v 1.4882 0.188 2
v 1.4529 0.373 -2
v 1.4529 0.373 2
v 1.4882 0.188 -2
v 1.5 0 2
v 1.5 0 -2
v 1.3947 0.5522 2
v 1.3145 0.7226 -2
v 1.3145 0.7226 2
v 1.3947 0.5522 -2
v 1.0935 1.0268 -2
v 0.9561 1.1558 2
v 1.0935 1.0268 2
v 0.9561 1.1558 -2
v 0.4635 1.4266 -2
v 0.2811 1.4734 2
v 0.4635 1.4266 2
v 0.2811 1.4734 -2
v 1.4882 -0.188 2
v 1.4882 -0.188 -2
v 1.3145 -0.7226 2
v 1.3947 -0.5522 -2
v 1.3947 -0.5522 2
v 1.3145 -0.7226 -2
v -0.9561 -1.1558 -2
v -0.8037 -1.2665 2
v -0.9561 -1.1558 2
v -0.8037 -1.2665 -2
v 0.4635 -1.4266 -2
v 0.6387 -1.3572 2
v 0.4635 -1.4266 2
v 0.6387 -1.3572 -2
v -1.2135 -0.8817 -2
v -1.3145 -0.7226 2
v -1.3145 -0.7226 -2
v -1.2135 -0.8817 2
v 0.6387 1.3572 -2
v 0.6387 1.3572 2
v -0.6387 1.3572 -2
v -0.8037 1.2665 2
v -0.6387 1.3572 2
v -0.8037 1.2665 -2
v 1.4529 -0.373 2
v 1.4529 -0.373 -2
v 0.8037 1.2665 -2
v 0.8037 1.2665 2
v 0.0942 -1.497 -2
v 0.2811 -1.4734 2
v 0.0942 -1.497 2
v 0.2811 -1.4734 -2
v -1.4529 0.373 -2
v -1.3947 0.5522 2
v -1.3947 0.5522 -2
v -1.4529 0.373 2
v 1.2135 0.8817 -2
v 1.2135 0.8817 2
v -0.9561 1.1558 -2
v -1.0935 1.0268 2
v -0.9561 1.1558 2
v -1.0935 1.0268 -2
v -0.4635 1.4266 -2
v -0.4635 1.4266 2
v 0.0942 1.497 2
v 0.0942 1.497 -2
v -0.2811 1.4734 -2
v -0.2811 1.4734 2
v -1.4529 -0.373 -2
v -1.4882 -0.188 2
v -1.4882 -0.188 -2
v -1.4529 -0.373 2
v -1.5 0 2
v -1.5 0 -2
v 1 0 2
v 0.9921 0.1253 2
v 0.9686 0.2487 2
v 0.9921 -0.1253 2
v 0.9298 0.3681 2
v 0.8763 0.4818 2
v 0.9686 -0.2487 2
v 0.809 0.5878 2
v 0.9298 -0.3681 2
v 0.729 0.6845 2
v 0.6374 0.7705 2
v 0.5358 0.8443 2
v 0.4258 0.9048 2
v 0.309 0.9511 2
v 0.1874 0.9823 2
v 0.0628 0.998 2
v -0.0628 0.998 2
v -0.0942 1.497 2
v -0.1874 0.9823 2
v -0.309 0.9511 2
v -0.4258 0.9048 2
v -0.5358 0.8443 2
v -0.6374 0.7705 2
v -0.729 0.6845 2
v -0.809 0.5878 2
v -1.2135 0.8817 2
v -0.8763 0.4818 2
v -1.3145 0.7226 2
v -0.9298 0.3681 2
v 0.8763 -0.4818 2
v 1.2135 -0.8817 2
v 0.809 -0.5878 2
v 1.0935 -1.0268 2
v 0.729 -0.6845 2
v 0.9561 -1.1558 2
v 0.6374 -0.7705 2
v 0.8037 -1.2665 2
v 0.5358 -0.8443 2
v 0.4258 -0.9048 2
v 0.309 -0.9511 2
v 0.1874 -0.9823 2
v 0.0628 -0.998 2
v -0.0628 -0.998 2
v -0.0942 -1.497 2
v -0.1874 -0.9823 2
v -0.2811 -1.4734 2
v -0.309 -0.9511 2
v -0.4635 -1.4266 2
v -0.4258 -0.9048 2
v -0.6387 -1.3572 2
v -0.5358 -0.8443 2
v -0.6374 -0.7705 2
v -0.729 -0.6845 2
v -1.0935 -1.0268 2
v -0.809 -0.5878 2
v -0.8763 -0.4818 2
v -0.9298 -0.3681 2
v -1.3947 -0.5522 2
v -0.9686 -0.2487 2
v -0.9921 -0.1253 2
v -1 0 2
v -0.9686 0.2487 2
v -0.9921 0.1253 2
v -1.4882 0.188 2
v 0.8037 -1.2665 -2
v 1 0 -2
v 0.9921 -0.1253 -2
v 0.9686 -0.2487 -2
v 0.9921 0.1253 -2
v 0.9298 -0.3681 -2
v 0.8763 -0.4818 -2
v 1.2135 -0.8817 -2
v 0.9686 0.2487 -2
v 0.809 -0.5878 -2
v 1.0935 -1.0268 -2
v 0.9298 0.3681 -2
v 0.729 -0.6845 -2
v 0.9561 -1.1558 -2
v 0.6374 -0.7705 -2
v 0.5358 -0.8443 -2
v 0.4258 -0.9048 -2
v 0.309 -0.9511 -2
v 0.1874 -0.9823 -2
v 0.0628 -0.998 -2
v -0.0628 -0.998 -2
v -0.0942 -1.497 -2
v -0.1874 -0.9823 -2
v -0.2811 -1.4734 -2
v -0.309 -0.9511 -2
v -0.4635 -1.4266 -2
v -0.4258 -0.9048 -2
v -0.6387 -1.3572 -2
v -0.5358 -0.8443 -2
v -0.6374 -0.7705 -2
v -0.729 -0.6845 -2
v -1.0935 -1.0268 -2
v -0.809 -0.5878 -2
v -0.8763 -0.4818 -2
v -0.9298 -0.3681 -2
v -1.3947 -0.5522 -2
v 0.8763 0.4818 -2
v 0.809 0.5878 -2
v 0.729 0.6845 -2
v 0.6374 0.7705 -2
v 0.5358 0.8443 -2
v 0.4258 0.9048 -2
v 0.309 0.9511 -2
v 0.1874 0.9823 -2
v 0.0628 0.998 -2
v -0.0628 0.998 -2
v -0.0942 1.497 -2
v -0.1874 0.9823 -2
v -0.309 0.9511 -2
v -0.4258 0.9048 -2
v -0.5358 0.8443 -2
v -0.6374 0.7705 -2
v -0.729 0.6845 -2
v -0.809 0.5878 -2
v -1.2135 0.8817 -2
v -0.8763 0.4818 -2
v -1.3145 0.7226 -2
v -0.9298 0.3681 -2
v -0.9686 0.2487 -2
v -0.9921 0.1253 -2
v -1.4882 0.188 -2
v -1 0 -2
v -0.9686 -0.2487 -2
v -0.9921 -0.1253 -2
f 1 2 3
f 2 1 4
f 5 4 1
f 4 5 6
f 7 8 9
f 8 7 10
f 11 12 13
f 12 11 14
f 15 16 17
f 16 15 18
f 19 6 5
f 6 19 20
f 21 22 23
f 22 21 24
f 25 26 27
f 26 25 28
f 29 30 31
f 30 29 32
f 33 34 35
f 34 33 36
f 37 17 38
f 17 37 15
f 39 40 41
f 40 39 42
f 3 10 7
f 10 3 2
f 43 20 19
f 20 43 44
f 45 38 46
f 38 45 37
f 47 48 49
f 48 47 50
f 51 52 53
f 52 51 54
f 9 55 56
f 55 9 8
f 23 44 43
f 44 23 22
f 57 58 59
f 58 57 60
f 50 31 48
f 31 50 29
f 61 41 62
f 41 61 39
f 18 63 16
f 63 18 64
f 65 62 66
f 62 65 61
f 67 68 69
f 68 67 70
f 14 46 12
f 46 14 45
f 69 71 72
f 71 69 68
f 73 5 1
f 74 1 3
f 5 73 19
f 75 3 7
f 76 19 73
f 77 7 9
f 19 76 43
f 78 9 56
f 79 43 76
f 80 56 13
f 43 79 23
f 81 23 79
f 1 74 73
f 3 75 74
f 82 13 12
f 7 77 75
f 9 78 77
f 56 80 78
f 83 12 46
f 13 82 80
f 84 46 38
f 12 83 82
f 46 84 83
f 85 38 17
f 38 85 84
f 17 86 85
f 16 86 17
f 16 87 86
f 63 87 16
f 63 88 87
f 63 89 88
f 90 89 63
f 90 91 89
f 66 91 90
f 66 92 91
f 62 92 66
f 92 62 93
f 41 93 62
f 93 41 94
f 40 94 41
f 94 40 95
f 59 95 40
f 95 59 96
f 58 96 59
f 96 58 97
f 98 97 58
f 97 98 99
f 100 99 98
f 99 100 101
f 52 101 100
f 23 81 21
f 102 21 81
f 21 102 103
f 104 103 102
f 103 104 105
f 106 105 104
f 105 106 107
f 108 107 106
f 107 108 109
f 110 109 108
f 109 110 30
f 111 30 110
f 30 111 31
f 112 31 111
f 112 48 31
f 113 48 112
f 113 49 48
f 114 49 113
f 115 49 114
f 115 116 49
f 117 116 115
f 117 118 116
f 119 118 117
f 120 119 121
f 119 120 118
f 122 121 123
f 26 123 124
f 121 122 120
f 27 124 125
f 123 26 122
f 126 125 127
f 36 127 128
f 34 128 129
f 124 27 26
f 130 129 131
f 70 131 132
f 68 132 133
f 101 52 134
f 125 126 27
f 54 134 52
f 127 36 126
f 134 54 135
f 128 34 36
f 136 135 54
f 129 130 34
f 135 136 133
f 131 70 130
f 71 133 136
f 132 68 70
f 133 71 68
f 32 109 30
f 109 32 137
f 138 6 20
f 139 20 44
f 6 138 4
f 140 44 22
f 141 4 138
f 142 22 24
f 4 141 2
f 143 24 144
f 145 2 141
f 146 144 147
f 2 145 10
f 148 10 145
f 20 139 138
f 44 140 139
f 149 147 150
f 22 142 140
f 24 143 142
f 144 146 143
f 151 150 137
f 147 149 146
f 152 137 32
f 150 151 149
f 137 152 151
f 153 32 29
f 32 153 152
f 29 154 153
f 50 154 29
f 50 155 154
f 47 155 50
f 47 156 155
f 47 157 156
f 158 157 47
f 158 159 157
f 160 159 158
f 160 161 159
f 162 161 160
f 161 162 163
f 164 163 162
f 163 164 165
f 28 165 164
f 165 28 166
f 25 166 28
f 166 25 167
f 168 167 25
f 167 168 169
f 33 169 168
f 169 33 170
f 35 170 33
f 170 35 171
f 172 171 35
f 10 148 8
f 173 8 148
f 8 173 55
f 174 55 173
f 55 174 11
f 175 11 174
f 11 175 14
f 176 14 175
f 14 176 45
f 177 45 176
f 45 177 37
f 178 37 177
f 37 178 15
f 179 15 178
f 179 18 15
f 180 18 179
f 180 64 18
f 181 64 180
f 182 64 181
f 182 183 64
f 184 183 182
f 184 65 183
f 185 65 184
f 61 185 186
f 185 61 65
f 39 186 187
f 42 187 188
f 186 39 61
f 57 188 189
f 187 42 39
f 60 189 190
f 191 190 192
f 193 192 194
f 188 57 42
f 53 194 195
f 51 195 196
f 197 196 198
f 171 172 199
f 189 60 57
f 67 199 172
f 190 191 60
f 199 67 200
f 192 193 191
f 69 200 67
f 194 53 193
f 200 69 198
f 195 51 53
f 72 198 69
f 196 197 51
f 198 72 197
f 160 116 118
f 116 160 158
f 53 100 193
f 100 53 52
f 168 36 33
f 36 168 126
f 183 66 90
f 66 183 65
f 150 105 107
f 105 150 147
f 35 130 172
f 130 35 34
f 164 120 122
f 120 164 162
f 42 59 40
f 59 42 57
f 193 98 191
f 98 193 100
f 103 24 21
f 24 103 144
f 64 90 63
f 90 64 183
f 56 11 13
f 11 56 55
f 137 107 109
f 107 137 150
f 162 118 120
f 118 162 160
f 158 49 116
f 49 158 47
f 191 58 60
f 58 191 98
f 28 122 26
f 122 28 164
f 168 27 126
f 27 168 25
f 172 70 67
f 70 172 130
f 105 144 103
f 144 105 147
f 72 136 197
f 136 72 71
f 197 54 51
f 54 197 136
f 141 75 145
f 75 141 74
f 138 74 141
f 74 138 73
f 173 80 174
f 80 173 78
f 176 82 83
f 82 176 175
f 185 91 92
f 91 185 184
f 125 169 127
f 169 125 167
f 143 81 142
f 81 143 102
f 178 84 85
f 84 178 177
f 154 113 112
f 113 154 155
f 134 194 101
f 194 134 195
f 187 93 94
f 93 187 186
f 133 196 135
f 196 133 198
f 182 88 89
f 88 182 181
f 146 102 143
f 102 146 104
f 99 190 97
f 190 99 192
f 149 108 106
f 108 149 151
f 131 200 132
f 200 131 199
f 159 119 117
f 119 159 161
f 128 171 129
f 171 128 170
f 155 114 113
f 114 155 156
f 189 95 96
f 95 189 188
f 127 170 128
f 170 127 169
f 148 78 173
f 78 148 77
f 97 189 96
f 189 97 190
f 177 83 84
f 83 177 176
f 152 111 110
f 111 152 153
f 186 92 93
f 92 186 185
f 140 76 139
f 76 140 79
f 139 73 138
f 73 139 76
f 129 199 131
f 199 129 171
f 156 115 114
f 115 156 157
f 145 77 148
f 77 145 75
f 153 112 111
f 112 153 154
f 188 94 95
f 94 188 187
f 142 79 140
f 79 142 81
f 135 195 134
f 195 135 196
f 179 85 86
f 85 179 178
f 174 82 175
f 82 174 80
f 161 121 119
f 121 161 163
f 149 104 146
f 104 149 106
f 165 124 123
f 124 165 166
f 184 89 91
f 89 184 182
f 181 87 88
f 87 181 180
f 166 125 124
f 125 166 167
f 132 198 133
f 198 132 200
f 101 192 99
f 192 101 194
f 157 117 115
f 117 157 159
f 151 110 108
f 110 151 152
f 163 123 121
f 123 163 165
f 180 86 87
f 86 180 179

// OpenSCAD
$fn = 50;


difference() {
	union() {
		translate(v = [0, 0, -2.0000000000]) {
			cylinder(h = 4, r = 1.5000000000);
		}
	}
	union() {
		translate(v = [0, 0, -100.0000000000]) {
			cylinder(h = 200, r = 1.0000000000);
		}
	}
}
